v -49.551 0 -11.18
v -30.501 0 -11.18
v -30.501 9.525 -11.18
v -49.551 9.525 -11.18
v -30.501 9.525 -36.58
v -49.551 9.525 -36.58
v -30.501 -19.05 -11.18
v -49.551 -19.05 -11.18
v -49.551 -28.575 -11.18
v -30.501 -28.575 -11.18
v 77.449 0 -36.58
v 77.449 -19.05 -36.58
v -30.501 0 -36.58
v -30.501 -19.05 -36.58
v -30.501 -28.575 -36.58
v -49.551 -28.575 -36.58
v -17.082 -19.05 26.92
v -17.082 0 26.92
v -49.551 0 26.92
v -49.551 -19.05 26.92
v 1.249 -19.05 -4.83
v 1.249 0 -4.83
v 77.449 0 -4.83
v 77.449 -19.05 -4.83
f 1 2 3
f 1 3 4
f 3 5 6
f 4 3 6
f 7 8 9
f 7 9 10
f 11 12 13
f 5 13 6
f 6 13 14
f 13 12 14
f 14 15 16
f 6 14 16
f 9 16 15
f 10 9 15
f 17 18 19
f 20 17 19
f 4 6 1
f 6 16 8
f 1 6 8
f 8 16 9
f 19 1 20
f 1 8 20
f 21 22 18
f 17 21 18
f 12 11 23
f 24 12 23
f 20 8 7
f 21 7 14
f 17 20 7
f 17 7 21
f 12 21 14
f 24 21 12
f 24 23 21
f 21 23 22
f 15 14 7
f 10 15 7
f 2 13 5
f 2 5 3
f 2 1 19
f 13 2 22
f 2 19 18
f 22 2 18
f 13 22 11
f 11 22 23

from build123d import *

# Parameters (mm, degrees)
F1_DEPTH = 19.05
F2_W     = 19.05
F2_H     = 25.4
F3_DEPTH = 9.525
F4_W     = 19.05
F4_H     = 25.4
F5_DEPTH = 9.525


with BuildPart() as f1:
    # F0 (on Front) → F1 (new body)
    with BuildSketch(Plane.XZ):
        Polygon((-49.55082, 26.919836), (-49.55082, -36.580164), (77.44918, -36.580164), (77.44918, -4.830164), (1.24918, -4.830164), (-17.081691, 26.919836), align=None)
    extrude(amount=F1_DEPTH)

    # F2 (on face) → F3 (join)
    with BuildSketch(Plane.XZ.offset(19.05)):
        with Locations((-40.02582, -23.880164)):
            Rectangle(F2_W, F2_H)
    extrude(amount=F3_DEPTH)

    # F4 (on face) → F5 (join)
    with BuildSketch(Plane(origin=(0, 0, 0), x_dir=(-1, 0, 0), z_dir=(0, 1, 0))):
        with Locations((40.02582, -23.880164)):
            Rectangle(F4_W, F4_H)
    extrude(amount=F5_DEPTH)


solid = f1.part
